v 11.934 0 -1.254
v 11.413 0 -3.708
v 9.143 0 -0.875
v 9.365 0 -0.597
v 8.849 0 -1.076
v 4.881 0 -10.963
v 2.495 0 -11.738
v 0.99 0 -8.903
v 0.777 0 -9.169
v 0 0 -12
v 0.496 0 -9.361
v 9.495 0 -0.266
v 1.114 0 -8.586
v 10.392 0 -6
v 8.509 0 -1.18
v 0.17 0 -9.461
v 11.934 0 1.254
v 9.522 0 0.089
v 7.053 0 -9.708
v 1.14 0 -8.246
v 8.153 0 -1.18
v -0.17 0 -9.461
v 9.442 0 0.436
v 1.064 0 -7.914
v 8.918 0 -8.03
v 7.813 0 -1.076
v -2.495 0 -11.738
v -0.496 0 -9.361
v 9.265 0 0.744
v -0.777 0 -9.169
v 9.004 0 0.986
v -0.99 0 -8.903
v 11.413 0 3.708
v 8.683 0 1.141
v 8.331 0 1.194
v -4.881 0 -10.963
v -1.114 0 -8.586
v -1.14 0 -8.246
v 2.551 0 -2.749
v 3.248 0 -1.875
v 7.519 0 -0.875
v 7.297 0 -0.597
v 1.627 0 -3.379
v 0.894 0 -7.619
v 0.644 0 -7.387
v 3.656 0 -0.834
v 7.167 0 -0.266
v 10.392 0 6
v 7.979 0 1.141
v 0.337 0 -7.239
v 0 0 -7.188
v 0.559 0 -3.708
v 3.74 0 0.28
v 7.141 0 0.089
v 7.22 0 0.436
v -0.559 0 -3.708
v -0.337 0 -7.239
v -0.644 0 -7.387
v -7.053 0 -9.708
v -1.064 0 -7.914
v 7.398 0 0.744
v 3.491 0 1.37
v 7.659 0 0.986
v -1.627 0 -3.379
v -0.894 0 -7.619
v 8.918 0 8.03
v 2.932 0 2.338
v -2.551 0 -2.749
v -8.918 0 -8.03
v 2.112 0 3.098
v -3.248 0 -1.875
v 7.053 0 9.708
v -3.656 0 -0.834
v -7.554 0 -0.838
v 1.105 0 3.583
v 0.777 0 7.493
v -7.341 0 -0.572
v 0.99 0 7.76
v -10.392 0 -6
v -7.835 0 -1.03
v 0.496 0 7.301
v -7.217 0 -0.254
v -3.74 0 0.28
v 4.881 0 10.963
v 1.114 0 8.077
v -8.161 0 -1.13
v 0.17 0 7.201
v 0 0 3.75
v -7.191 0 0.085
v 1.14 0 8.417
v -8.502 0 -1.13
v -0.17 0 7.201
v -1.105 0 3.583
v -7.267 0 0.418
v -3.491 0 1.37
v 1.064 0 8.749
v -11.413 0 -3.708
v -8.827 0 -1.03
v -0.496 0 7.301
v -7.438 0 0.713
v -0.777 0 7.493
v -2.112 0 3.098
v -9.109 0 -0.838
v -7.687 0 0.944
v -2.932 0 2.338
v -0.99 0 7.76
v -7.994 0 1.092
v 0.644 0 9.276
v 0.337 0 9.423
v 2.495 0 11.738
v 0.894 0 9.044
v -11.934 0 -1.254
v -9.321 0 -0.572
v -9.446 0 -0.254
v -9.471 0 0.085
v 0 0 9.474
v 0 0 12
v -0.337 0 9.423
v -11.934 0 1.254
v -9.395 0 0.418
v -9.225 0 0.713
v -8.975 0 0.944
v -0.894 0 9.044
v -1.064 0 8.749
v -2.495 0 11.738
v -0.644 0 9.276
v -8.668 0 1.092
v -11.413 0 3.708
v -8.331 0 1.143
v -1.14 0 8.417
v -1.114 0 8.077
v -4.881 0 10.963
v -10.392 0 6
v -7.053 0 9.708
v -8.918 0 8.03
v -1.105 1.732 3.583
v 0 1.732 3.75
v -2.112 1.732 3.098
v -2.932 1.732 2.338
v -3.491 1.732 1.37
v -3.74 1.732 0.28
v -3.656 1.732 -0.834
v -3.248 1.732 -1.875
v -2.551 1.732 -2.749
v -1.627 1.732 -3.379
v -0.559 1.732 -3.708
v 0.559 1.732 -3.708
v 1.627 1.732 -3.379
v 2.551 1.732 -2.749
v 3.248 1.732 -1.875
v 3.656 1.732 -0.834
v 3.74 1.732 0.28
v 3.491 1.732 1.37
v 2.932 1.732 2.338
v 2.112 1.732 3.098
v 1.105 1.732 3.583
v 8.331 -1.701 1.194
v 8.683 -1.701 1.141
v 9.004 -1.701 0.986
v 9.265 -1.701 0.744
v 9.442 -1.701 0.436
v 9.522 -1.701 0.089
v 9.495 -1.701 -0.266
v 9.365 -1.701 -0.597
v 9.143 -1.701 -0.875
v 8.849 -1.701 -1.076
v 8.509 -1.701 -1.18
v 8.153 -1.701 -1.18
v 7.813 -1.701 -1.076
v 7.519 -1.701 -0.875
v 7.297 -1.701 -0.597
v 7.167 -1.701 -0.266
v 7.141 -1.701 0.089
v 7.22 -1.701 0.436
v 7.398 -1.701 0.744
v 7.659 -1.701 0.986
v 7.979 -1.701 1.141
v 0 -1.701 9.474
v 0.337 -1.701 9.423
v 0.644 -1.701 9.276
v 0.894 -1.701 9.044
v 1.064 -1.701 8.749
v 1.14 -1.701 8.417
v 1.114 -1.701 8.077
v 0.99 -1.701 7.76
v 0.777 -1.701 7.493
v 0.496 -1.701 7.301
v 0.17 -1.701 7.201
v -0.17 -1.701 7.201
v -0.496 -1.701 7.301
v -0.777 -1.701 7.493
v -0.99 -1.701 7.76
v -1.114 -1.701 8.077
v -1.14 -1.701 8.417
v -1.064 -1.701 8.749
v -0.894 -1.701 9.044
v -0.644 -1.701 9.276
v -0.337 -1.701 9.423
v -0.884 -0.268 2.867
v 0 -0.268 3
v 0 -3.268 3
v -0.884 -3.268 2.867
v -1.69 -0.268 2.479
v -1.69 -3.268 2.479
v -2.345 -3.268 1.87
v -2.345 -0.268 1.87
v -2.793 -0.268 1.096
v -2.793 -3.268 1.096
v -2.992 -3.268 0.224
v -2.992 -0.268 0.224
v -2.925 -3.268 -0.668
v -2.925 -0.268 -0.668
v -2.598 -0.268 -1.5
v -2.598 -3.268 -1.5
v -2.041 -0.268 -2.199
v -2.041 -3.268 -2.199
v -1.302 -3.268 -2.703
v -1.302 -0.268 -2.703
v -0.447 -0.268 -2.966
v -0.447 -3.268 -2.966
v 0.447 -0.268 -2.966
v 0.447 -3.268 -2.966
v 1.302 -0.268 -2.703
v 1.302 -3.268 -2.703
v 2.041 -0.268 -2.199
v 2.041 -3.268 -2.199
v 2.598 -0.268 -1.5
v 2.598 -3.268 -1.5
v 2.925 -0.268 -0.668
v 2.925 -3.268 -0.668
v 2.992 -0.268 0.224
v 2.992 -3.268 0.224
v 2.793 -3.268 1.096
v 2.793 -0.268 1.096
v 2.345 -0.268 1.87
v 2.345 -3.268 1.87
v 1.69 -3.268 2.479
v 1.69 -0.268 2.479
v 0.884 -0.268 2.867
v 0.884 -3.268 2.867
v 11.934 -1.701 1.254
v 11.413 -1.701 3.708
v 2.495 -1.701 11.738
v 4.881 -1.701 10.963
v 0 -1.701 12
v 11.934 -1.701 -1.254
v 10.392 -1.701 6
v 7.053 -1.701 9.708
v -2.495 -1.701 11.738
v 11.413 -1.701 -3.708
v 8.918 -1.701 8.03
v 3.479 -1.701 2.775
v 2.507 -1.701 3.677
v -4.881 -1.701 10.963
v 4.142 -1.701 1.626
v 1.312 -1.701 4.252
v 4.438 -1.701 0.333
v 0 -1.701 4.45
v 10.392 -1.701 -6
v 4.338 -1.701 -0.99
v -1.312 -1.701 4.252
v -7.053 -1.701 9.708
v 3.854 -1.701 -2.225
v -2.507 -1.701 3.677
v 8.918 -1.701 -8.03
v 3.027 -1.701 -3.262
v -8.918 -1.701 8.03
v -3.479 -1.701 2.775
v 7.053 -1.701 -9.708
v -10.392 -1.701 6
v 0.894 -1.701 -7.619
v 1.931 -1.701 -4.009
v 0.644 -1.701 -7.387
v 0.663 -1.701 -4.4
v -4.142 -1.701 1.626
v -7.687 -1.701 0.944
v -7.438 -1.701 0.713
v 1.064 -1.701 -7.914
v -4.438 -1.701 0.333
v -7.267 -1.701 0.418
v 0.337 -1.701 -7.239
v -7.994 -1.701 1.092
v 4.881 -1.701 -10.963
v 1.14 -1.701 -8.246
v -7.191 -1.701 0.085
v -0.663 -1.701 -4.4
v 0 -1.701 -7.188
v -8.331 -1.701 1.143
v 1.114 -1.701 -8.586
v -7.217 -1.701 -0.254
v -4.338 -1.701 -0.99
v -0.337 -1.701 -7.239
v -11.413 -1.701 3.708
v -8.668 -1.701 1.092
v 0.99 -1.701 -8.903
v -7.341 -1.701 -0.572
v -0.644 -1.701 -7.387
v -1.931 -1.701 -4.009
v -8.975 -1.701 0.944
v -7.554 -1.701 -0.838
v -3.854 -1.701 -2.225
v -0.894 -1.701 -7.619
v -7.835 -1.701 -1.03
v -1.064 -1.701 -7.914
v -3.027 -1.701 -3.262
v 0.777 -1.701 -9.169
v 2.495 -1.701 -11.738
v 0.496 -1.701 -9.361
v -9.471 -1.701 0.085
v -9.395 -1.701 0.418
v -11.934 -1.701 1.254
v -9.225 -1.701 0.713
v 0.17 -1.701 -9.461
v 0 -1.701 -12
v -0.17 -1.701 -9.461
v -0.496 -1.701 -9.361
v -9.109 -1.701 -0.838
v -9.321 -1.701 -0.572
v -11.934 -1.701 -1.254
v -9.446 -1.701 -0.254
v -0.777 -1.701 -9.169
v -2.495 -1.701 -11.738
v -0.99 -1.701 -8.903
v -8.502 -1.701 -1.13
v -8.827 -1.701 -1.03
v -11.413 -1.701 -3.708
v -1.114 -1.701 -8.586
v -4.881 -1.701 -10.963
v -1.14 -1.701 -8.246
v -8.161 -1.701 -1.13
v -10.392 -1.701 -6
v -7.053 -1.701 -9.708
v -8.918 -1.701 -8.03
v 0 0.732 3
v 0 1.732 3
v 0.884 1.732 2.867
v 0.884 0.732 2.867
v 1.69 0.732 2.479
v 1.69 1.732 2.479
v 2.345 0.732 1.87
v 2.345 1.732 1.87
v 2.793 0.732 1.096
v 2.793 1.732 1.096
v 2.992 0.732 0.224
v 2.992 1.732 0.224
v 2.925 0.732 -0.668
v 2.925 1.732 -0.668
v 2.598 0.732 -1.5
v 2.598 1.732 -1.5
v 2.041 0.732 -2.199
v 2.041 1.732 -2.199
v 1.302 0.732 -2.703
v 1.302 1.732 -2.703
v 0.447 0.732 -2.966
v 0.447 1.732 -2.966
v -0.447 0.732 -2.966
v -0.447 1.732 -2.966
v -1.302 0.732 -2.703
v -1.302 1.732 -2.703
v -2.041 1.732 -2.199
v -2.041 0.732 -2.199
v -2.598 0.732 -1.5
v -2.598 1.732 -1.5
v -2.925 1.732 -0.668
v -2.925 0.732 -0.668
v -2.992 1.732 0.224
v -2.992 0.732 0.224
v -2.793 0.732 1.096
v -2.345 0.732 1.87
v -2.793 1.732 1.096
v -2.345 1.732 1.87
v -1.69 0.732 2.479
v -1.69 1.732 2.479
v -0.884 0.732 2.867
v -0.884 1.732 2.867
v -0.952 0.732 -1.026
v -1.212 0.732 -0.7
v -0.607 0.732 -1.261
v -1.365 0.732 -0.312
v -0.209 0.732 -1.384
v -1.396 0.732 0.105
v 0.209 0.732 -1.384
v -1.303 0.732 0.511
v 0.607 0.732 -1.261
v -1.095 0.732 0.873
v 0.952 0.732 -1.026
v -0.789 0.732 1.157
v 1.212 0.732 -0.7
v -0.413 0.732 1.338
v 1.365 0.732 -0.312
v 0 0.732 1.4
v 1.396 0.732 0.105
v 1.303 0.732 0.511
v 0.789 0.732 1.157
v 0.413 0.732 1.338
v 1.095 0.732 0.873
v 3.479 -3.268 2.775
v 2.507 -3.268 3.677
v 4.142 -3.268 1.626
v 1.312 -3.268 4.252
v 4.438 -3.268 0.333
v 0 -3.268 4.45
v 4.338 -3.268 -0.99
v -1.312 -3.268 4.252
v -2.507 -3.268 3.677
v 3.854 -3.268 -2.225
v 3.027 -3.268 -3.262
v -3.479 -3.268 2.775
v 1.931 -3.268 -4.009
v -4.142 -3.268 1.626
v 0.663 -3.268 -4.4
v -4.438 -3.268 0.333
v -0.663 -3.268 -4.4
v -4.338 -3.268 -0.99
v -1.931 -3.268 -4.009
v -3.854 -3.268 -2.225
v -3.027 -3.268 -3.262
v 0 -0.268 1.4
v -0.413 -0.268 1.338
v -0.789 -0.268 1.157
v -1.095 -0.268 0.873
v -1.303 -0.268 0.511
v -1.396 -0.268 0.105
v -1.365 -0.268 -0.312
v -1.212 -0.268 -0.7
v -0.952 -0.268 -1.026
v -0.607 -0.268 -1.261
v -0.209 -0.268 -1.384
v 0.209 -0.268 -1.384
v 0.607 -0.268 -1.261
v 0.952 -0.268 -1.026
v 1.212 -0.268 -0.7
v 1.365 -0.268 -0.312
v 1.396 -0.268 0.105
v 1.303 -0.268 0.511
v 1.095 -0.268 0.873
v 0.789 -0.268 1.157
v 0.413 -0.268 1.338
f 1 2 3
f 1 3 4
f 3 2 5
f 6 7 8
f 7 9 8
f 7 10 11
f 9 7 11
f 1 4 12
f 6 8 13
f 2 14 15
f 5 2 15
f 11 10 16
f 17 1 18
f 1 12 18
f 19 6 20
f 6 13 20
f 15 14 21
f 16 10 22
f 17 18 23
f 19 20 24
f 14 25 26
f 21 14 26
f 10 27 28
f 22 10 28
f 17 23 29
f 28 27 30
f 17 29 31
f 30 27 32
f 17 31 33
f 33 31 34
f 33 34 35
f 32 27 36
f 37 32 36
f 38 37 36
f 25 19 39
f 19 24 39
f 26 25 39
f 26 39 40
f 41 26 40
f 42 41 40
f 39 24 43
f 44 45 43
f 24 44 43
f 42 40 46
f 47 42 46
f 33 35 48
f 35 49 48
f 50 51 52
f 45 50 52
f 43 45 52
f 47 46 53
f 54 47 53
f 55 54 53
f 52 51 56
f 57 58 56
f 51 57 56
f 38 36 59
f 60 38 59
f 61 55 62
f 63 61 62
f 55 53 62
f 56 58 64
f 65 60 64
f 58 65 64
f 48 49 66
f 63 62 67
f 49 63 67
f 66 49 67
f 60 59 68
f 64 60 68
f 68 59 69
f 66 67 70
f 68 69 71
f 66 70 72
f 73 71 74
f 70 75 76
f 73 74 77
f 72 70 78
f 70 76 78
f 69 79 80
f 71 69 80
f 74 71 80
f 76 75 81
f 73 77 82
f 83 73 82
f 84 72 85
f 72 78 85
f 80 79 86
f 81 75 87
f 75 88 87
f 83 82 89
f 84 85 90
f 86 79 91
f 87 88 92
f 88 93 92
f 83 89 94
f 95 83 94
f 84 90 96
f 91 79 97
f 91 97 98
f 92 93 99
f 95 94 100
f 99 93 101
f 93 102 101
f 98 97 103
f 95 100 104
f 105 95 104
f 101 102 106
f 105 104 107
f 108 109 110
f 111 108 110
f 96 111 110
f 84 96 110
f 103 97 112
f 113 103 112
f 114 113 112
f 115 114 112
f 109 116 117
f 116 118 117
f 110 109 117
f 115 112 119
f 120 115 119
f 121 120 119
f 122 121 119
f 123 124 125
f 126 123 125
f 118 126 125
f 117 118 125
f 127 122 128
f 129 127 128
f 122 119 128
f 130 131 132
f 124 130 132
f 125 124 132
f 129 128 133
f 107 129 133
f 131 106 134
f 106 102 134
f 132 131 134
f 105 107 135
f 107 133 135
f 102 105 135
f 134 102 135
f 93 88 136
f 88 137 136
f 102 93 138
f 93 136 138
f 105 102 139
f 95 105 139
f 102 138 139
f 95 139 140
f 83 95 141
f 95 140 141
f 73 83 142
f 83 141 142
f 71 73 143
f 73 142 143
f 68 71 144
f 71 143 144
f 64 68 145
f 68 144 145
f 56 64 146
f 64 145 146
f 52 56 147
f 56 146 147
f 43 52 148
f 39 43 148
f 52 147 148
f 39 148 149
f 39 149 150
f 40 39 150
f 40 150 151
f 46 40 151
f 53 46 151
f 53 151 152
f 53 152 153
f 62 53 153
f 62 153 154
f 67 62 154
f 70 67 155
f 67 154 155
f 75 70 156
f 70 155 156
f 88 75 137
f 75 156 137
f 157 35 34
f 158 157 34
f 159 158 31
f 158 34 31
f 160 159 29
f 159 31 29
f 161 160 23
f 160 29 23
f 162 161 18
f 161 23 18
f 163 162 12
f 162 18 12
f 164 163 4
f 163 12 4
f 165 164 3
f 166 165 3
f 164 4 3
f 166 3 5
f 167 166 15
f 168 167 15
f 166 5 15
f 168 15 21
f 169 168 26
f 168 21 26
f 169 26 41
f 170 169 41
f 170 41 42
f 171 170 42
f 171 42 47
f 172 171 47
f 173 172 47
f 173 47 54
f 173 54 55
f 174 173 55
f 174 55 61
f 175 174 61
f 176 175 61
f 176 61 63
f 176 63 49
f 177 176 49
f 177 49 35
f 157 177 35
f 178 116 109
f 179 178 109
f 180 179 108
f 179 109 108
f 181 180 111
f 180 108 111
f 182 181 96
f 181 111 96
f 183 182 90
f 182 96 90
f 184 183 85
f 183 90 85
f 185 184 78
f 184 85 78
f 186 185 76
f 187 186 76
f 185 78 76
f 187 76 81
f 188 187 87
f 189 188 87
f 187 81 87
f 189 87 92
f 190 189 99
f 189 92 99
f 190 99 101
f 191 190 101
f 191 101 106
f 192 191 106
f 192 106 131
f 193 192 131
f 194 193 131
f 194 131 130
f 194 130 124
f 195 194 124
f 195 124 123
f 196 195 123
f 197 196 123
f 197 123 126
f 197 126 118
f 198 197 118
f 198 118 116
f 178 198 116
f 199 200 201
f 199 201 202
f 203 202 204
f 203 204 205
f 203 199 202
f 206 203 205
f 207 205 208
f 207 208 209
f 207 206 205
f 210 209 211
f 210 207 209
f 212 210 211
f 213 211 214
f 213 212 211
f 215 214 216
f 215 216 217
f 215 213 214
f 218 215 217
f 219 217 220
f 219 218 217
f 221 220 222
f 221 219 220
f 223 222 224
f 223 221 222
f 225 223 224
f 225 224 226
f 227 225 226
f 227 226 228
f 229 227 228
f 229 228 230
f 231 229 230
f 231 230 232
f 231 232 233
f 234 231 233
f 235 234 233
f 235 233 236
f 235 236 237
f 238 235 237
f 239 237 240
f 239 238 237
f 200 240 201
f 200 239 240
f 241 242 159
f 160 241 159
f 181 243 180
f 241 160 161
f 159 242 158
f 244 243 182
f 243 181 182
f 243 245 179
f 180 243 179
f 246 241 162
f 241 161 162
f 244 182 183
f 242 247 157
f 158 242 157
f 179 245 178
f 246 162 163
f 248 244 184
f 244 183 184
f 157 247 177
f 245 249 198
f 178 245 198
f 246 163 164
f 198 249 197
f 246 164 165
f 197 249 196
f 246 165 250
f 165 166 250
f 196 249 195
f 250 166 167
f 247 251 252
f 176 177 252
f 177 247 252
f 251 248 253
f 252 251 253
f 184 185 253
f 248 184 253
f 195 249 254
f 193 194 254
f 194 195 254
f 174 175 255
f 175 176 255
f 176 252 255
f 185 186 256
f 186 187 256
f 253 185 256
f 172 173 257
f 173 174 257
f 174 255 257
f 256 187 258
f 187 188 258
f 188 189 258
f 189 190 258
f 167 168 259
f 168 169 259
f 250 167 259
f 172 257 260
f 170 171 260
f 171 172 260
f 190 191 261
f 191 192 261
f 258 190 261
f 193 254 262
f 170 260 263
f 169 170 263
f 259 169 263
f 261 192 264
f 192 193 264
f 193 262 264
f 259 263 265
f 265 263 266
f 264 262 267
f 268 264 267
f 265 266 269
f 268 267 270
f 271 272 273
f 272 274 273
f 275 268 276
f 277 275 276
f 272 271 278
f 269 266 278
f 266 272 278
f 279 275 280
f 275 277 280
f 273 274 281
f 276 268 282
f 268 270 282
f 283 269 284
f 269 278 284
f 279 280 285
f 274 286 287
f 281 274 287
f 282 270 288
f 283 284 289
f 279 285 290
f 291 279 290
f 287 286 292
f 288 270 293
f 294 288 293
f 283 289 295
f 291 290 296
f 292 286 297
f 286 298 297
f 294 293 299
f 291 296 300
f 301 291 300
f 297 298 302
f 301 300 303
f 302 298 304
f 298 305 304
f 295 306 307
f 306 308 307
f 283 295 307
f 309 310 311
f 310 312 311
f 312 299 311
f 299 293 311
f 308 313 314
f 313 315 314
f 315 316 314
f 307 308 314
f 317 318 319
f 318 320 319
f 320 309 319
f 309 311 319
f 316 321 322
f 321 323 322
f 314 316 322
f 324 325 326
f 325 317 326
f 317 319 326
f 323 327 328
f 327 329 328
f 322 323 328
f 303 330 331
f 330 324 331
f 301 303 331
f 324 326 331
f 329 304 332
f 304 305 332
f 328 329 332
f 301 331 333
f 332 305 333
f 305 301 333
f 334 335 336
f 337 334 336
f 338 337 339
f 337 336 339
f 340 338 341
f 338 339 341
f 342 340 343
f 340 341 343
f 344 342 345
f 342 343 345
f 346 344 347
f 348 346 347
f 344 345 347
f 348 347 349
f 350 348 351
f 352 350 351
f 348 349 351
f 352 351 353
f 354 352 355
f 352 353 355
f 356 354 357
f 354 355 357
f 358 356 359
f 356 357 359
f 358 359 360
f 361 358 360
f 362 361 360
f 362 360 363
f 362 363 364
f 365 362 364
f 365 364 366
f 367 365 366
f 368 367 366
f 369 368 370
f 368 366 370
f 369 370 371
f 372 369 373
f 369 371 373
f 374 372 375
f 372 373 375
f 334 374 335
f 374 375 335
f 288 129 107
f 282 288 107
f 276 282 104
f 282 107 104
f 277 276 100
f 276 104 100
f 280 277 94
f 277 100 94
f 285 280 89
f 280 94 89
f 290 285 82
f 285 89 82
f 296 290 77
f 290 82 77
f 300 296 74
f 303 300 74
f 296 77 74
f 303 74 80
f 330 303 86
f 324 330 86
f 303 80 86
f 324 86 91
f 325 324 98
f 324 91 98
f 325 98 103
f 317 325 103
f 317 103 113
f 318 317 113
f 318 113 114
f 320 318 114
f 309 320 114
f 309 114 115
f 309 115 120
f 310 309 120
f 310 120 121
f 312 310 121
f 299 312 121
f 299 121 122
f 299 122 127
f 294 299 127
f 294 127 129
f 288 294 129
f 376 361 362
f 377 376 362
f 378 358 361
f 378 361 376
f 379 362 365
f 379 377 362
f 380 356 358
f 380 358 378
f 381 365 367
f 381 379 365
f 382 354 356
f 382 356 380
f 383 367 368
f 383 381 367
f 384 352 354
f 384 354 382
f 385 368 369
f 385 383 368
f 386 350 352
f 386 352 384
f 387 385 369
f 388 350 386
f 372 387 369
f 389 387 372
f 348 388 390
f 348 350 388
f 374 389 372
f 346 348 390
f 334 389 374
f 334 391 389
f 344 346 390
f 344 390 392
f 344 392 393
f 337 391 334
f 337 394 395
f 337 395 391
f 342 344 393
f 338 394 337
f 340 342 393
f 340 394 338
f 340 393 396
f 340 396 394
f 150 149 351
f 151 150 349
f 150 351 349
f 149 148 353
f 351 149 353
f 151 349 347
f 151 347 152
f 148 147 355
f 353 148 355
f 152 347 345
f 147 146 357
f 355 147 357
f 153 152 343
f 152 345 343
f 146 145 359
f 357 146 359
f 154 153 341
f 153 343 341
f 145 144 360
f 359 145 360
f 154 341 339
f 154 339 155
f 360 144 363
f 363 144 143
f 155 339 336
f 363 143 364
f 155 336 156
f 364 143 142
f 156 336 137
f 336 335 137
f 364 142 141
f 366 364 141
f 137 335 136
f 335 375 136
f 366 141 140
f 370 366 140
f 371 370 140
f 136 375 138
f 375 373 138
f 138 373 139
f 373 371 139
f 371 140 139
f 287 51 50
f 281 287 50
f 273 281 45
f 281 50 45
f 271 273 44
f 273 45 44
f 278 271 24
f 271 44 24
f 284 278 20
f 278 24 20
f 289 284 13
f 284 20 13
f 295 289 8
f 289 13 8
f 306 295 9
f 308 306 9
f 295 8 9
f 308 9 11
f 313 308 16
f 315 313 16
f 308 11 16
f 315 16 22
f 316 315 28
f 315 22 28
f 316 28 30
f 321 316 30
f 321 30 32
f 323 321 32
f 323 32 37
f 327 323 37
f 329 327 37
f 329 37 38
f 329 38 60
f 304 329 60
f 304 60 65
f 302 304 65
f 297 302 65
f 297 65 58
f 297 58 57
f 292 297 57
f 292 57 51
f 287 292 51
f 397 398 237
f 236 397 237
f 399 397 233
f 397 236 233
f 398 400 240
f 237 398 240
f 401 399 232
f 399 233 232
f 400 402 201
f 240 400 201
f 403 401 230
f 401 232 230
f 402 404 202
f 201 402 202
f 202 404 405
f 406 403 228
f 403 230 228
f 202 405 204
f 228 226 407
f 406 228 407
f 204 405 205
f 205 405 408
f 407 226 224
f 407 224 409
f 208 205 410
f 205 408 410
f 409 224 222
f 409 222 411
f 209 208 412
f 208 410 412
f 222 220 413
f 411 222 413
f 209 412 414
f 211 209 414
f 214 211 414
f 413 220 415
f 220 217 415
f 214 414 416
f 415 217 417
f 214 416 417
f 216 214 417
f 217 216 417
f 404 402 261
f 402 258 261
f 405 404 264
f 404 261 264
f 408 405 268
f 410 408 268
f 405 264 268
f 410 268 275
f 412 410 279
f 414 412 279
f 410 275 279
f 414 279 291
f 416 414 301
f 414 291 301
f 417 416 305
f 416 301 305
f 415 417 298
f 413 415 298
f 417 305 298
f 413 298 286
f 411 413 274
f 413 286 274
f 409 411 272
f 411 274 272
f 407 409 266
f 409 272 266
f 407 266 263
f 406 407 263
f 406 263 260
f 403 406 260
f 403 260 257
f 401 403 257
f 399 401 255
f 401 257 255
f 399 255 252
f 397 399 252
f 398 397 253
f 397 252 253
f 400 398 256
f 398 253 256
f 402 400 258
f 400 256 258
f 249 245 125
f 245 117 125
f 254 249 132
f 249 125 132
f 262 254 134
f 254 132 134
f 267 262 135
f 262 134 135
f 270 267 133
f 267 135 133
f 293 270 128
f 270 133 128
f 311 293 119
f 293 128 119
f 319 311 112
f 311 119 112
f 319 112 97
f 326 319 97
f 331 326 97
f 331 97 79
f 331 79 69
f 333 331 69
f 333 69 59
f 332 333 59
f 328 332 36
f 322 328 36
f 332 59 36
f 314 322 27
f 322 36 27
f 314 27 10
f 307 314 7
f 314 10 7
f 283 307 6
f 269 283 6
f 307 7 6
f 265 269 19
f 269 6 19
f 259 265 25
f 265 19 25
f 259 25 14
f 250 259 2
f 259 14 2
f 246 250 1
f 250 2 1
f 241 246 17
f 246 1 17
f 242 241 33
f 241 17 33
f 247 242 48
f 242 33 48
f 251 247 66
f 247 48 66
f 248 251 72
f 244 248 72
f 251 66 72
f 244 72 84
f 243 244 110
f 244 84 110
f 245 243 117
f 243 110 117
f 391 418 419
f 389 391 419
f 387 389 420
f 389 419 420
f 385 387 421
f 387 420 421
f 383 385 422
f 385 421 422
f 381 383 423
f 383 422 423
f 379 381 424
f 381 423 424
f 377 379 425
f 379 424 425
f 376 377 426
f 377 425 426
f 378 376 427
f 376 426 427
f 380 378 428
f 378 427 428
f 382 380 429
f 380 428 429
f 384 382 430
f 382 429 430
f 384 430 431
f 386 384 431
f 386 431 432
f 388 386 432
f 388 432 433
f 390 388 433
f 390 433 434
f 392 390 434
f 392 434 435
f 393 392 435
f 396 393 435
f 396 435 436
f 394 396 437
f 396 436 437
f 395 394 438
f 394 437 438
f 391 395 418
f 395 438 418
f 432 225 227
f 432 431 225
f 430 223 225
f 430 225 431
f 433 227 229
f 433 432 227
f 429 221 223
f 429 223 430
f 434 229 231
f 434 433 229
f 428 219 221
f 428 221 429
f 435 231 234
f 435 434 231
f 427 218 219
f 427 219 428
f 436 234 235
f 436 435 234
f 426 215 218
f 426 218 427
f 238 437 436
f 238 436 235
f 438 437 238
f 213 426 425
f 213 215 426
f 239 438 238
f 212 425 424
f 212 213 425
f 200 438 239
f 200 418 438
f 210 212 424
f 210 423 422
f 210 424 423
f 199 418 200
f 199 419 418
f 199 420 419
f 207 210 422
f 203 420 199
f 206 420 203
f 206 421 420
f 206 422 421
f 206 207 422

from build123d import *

# Parameters (mm, degrees)
SKETCH4_R          = 3
CUT_EXTRUDE1_DEPTH = 1
CUT_EXTRUDE2_START = -3
SKETCH5_R          = 3
CUT_EXTRUDE2_DEPTH = 3
CUT_EXTRUDE3_REACH = 19.282
SKETCH6_R          = 1.143
SKETCH6_R_2        = 1.1938


with BuildPart() as part:
    # Sketch1 → Revolve1 (revolve)
    with BuildSketch(Plane.XY, mode=Mode.PRIVATE) as revolve1_sk:
        Polygon((-12, 0), (-3.75, 0), (-3.75, 1.732400048), (-1.4, 1.732400048), (-1.4, -3.267599952), (-4.45, -3.267599952), (-4.45, -1.700599952), (-12, -1.700599952), align=None)
    revolve(revolve1_sk.sketch.rotate(Axis((0, 0, 0), (0, -1, 0)), 270), axis=Axis((0, 0, 0), (0, -1, 0)))

    # Sketch4 → Cut-Extrude1 (cut)
    with BuildSketch(Plane(origin=(0, 1.732400048, 0), x_dir=(-1, 0, 0), z_dir=(0, 1, 0))):
        with Locations(Location((0, 0, 0), (0, 0, 90))):
            Circle(SKETCH4_R)
    extrude(amount=-CUT_EXTRUDE1_DEPTH, mode=Mode.SUBTRACT)

    # Sketch5 → Cut-Extrude2 (cut)
    with BuildSketch(Plane.XZ.offset(3.267599952).offset(CUT_EXTRUDE2_START)):
        with Locations(Location((0, 0, 0), (0, 0, 90))):
            Circle(SKETCH5_R)
    extrude(amount=CUT_EXTRUDE2_DEPTH, mode=Mode.SUBTRACT)

    # Sketch6 → Cut-Extrude3 (cut, up to next)
    with BuildSketch(Plane(origin=(0, 0, 0), x_dir=(1, 0, 0), z_dir=(0, 1, 0)), mode=Mode.PRIVATE) as cut_extrude3_sk1:
        with Locations(Location((0, 8.3312, 0), (0, 0, 270))):
            Circle(SKETCH6_R)
    cut_extrude3_tool1 = extrude(cut_extrude3_sk1.sketch, amount=-CUT_EXTRUDE3_REACH, mode=Mode.PRIVATE) & part.part
    # Sketch6 → Cut-Extrude3 (cut, up to next)
    with BuildSketch(Plane(origin=(0, 0, 0), x_dir=(1, 0, 0), z_dir=(0, 1, 0)), mode=Mode.PRIVATE) as cut_extrude3_sk2:
        with Locations(Location((-8.3312, 0, 0), (0, 0, 270))):
            Circle(SKETCH6_R)
    cut_extrude3_tool2 = extrude(cut_extrude3_sk2.sketch, amount=-CUT_EXTRUDE3_REACH, mode=Mode.PRIVATE) & part.part
    # Sketch6 → Cut-Extrude3 (cut, up to next)
    with BuildSketch(Plane(origin=(0, 0, 0), x_dir=(1, 0, 0), z_dir=(0, 1, 0)), mode=Mode.PRIVATE) as cut_extrude3_sk3:
        with Locations(Location((0, -8.3312, 0), (0, 0, 270))):
            Circle(SKETCH6_R)
    cut_extrude3_tool3 = extrude(cut_extrude3_sk3.sketch, amount=-CUT_EXTRUDE3_REACH, mode=Mode.PRIVATE) & part.part
    # Sketch6 → Cut-Extrude3 (cut, up to next)
    with BuildSketch(Plane(origin=(0, 0, 0), x_dir=(1, 0, 0), z_dir=(0, 1, 0)), mode=Mode.PRIVATE) as cut_extrude3_sk4:
        with Locations(Location((8.3312, 0, 0), (0, 0, 270))):
            Circle(SKETCH6_R_2)
    cut_extrude3_tool4 = extrude(cut_extrude3_sk4.sketch, amount=-CUT_EXTRUDE3_REACH, mode=Mode.PRIVATE) & part.part
    add(cut_extrude3_tool1.solids().sort_by_distance((0, 0, -8.3312))[0], mode=Mode.SUBTRACT)
    add(cut_extrude3_tool2.solids().sort_by_distance((-8.3312, 0, 0))[0], mode=Mode.SUBTRACT)
    add(cut_extrude3_tool3.solids().sort_by_distance((0, 0, 8.3312))[0], mode=Mode.SUBTRACT)
    add(cut_extrude3_tool4.solids().sort_by_distance((8.3312, 0, 0))[0], mode=Mode.SUBTRACT)


solid = part.part
